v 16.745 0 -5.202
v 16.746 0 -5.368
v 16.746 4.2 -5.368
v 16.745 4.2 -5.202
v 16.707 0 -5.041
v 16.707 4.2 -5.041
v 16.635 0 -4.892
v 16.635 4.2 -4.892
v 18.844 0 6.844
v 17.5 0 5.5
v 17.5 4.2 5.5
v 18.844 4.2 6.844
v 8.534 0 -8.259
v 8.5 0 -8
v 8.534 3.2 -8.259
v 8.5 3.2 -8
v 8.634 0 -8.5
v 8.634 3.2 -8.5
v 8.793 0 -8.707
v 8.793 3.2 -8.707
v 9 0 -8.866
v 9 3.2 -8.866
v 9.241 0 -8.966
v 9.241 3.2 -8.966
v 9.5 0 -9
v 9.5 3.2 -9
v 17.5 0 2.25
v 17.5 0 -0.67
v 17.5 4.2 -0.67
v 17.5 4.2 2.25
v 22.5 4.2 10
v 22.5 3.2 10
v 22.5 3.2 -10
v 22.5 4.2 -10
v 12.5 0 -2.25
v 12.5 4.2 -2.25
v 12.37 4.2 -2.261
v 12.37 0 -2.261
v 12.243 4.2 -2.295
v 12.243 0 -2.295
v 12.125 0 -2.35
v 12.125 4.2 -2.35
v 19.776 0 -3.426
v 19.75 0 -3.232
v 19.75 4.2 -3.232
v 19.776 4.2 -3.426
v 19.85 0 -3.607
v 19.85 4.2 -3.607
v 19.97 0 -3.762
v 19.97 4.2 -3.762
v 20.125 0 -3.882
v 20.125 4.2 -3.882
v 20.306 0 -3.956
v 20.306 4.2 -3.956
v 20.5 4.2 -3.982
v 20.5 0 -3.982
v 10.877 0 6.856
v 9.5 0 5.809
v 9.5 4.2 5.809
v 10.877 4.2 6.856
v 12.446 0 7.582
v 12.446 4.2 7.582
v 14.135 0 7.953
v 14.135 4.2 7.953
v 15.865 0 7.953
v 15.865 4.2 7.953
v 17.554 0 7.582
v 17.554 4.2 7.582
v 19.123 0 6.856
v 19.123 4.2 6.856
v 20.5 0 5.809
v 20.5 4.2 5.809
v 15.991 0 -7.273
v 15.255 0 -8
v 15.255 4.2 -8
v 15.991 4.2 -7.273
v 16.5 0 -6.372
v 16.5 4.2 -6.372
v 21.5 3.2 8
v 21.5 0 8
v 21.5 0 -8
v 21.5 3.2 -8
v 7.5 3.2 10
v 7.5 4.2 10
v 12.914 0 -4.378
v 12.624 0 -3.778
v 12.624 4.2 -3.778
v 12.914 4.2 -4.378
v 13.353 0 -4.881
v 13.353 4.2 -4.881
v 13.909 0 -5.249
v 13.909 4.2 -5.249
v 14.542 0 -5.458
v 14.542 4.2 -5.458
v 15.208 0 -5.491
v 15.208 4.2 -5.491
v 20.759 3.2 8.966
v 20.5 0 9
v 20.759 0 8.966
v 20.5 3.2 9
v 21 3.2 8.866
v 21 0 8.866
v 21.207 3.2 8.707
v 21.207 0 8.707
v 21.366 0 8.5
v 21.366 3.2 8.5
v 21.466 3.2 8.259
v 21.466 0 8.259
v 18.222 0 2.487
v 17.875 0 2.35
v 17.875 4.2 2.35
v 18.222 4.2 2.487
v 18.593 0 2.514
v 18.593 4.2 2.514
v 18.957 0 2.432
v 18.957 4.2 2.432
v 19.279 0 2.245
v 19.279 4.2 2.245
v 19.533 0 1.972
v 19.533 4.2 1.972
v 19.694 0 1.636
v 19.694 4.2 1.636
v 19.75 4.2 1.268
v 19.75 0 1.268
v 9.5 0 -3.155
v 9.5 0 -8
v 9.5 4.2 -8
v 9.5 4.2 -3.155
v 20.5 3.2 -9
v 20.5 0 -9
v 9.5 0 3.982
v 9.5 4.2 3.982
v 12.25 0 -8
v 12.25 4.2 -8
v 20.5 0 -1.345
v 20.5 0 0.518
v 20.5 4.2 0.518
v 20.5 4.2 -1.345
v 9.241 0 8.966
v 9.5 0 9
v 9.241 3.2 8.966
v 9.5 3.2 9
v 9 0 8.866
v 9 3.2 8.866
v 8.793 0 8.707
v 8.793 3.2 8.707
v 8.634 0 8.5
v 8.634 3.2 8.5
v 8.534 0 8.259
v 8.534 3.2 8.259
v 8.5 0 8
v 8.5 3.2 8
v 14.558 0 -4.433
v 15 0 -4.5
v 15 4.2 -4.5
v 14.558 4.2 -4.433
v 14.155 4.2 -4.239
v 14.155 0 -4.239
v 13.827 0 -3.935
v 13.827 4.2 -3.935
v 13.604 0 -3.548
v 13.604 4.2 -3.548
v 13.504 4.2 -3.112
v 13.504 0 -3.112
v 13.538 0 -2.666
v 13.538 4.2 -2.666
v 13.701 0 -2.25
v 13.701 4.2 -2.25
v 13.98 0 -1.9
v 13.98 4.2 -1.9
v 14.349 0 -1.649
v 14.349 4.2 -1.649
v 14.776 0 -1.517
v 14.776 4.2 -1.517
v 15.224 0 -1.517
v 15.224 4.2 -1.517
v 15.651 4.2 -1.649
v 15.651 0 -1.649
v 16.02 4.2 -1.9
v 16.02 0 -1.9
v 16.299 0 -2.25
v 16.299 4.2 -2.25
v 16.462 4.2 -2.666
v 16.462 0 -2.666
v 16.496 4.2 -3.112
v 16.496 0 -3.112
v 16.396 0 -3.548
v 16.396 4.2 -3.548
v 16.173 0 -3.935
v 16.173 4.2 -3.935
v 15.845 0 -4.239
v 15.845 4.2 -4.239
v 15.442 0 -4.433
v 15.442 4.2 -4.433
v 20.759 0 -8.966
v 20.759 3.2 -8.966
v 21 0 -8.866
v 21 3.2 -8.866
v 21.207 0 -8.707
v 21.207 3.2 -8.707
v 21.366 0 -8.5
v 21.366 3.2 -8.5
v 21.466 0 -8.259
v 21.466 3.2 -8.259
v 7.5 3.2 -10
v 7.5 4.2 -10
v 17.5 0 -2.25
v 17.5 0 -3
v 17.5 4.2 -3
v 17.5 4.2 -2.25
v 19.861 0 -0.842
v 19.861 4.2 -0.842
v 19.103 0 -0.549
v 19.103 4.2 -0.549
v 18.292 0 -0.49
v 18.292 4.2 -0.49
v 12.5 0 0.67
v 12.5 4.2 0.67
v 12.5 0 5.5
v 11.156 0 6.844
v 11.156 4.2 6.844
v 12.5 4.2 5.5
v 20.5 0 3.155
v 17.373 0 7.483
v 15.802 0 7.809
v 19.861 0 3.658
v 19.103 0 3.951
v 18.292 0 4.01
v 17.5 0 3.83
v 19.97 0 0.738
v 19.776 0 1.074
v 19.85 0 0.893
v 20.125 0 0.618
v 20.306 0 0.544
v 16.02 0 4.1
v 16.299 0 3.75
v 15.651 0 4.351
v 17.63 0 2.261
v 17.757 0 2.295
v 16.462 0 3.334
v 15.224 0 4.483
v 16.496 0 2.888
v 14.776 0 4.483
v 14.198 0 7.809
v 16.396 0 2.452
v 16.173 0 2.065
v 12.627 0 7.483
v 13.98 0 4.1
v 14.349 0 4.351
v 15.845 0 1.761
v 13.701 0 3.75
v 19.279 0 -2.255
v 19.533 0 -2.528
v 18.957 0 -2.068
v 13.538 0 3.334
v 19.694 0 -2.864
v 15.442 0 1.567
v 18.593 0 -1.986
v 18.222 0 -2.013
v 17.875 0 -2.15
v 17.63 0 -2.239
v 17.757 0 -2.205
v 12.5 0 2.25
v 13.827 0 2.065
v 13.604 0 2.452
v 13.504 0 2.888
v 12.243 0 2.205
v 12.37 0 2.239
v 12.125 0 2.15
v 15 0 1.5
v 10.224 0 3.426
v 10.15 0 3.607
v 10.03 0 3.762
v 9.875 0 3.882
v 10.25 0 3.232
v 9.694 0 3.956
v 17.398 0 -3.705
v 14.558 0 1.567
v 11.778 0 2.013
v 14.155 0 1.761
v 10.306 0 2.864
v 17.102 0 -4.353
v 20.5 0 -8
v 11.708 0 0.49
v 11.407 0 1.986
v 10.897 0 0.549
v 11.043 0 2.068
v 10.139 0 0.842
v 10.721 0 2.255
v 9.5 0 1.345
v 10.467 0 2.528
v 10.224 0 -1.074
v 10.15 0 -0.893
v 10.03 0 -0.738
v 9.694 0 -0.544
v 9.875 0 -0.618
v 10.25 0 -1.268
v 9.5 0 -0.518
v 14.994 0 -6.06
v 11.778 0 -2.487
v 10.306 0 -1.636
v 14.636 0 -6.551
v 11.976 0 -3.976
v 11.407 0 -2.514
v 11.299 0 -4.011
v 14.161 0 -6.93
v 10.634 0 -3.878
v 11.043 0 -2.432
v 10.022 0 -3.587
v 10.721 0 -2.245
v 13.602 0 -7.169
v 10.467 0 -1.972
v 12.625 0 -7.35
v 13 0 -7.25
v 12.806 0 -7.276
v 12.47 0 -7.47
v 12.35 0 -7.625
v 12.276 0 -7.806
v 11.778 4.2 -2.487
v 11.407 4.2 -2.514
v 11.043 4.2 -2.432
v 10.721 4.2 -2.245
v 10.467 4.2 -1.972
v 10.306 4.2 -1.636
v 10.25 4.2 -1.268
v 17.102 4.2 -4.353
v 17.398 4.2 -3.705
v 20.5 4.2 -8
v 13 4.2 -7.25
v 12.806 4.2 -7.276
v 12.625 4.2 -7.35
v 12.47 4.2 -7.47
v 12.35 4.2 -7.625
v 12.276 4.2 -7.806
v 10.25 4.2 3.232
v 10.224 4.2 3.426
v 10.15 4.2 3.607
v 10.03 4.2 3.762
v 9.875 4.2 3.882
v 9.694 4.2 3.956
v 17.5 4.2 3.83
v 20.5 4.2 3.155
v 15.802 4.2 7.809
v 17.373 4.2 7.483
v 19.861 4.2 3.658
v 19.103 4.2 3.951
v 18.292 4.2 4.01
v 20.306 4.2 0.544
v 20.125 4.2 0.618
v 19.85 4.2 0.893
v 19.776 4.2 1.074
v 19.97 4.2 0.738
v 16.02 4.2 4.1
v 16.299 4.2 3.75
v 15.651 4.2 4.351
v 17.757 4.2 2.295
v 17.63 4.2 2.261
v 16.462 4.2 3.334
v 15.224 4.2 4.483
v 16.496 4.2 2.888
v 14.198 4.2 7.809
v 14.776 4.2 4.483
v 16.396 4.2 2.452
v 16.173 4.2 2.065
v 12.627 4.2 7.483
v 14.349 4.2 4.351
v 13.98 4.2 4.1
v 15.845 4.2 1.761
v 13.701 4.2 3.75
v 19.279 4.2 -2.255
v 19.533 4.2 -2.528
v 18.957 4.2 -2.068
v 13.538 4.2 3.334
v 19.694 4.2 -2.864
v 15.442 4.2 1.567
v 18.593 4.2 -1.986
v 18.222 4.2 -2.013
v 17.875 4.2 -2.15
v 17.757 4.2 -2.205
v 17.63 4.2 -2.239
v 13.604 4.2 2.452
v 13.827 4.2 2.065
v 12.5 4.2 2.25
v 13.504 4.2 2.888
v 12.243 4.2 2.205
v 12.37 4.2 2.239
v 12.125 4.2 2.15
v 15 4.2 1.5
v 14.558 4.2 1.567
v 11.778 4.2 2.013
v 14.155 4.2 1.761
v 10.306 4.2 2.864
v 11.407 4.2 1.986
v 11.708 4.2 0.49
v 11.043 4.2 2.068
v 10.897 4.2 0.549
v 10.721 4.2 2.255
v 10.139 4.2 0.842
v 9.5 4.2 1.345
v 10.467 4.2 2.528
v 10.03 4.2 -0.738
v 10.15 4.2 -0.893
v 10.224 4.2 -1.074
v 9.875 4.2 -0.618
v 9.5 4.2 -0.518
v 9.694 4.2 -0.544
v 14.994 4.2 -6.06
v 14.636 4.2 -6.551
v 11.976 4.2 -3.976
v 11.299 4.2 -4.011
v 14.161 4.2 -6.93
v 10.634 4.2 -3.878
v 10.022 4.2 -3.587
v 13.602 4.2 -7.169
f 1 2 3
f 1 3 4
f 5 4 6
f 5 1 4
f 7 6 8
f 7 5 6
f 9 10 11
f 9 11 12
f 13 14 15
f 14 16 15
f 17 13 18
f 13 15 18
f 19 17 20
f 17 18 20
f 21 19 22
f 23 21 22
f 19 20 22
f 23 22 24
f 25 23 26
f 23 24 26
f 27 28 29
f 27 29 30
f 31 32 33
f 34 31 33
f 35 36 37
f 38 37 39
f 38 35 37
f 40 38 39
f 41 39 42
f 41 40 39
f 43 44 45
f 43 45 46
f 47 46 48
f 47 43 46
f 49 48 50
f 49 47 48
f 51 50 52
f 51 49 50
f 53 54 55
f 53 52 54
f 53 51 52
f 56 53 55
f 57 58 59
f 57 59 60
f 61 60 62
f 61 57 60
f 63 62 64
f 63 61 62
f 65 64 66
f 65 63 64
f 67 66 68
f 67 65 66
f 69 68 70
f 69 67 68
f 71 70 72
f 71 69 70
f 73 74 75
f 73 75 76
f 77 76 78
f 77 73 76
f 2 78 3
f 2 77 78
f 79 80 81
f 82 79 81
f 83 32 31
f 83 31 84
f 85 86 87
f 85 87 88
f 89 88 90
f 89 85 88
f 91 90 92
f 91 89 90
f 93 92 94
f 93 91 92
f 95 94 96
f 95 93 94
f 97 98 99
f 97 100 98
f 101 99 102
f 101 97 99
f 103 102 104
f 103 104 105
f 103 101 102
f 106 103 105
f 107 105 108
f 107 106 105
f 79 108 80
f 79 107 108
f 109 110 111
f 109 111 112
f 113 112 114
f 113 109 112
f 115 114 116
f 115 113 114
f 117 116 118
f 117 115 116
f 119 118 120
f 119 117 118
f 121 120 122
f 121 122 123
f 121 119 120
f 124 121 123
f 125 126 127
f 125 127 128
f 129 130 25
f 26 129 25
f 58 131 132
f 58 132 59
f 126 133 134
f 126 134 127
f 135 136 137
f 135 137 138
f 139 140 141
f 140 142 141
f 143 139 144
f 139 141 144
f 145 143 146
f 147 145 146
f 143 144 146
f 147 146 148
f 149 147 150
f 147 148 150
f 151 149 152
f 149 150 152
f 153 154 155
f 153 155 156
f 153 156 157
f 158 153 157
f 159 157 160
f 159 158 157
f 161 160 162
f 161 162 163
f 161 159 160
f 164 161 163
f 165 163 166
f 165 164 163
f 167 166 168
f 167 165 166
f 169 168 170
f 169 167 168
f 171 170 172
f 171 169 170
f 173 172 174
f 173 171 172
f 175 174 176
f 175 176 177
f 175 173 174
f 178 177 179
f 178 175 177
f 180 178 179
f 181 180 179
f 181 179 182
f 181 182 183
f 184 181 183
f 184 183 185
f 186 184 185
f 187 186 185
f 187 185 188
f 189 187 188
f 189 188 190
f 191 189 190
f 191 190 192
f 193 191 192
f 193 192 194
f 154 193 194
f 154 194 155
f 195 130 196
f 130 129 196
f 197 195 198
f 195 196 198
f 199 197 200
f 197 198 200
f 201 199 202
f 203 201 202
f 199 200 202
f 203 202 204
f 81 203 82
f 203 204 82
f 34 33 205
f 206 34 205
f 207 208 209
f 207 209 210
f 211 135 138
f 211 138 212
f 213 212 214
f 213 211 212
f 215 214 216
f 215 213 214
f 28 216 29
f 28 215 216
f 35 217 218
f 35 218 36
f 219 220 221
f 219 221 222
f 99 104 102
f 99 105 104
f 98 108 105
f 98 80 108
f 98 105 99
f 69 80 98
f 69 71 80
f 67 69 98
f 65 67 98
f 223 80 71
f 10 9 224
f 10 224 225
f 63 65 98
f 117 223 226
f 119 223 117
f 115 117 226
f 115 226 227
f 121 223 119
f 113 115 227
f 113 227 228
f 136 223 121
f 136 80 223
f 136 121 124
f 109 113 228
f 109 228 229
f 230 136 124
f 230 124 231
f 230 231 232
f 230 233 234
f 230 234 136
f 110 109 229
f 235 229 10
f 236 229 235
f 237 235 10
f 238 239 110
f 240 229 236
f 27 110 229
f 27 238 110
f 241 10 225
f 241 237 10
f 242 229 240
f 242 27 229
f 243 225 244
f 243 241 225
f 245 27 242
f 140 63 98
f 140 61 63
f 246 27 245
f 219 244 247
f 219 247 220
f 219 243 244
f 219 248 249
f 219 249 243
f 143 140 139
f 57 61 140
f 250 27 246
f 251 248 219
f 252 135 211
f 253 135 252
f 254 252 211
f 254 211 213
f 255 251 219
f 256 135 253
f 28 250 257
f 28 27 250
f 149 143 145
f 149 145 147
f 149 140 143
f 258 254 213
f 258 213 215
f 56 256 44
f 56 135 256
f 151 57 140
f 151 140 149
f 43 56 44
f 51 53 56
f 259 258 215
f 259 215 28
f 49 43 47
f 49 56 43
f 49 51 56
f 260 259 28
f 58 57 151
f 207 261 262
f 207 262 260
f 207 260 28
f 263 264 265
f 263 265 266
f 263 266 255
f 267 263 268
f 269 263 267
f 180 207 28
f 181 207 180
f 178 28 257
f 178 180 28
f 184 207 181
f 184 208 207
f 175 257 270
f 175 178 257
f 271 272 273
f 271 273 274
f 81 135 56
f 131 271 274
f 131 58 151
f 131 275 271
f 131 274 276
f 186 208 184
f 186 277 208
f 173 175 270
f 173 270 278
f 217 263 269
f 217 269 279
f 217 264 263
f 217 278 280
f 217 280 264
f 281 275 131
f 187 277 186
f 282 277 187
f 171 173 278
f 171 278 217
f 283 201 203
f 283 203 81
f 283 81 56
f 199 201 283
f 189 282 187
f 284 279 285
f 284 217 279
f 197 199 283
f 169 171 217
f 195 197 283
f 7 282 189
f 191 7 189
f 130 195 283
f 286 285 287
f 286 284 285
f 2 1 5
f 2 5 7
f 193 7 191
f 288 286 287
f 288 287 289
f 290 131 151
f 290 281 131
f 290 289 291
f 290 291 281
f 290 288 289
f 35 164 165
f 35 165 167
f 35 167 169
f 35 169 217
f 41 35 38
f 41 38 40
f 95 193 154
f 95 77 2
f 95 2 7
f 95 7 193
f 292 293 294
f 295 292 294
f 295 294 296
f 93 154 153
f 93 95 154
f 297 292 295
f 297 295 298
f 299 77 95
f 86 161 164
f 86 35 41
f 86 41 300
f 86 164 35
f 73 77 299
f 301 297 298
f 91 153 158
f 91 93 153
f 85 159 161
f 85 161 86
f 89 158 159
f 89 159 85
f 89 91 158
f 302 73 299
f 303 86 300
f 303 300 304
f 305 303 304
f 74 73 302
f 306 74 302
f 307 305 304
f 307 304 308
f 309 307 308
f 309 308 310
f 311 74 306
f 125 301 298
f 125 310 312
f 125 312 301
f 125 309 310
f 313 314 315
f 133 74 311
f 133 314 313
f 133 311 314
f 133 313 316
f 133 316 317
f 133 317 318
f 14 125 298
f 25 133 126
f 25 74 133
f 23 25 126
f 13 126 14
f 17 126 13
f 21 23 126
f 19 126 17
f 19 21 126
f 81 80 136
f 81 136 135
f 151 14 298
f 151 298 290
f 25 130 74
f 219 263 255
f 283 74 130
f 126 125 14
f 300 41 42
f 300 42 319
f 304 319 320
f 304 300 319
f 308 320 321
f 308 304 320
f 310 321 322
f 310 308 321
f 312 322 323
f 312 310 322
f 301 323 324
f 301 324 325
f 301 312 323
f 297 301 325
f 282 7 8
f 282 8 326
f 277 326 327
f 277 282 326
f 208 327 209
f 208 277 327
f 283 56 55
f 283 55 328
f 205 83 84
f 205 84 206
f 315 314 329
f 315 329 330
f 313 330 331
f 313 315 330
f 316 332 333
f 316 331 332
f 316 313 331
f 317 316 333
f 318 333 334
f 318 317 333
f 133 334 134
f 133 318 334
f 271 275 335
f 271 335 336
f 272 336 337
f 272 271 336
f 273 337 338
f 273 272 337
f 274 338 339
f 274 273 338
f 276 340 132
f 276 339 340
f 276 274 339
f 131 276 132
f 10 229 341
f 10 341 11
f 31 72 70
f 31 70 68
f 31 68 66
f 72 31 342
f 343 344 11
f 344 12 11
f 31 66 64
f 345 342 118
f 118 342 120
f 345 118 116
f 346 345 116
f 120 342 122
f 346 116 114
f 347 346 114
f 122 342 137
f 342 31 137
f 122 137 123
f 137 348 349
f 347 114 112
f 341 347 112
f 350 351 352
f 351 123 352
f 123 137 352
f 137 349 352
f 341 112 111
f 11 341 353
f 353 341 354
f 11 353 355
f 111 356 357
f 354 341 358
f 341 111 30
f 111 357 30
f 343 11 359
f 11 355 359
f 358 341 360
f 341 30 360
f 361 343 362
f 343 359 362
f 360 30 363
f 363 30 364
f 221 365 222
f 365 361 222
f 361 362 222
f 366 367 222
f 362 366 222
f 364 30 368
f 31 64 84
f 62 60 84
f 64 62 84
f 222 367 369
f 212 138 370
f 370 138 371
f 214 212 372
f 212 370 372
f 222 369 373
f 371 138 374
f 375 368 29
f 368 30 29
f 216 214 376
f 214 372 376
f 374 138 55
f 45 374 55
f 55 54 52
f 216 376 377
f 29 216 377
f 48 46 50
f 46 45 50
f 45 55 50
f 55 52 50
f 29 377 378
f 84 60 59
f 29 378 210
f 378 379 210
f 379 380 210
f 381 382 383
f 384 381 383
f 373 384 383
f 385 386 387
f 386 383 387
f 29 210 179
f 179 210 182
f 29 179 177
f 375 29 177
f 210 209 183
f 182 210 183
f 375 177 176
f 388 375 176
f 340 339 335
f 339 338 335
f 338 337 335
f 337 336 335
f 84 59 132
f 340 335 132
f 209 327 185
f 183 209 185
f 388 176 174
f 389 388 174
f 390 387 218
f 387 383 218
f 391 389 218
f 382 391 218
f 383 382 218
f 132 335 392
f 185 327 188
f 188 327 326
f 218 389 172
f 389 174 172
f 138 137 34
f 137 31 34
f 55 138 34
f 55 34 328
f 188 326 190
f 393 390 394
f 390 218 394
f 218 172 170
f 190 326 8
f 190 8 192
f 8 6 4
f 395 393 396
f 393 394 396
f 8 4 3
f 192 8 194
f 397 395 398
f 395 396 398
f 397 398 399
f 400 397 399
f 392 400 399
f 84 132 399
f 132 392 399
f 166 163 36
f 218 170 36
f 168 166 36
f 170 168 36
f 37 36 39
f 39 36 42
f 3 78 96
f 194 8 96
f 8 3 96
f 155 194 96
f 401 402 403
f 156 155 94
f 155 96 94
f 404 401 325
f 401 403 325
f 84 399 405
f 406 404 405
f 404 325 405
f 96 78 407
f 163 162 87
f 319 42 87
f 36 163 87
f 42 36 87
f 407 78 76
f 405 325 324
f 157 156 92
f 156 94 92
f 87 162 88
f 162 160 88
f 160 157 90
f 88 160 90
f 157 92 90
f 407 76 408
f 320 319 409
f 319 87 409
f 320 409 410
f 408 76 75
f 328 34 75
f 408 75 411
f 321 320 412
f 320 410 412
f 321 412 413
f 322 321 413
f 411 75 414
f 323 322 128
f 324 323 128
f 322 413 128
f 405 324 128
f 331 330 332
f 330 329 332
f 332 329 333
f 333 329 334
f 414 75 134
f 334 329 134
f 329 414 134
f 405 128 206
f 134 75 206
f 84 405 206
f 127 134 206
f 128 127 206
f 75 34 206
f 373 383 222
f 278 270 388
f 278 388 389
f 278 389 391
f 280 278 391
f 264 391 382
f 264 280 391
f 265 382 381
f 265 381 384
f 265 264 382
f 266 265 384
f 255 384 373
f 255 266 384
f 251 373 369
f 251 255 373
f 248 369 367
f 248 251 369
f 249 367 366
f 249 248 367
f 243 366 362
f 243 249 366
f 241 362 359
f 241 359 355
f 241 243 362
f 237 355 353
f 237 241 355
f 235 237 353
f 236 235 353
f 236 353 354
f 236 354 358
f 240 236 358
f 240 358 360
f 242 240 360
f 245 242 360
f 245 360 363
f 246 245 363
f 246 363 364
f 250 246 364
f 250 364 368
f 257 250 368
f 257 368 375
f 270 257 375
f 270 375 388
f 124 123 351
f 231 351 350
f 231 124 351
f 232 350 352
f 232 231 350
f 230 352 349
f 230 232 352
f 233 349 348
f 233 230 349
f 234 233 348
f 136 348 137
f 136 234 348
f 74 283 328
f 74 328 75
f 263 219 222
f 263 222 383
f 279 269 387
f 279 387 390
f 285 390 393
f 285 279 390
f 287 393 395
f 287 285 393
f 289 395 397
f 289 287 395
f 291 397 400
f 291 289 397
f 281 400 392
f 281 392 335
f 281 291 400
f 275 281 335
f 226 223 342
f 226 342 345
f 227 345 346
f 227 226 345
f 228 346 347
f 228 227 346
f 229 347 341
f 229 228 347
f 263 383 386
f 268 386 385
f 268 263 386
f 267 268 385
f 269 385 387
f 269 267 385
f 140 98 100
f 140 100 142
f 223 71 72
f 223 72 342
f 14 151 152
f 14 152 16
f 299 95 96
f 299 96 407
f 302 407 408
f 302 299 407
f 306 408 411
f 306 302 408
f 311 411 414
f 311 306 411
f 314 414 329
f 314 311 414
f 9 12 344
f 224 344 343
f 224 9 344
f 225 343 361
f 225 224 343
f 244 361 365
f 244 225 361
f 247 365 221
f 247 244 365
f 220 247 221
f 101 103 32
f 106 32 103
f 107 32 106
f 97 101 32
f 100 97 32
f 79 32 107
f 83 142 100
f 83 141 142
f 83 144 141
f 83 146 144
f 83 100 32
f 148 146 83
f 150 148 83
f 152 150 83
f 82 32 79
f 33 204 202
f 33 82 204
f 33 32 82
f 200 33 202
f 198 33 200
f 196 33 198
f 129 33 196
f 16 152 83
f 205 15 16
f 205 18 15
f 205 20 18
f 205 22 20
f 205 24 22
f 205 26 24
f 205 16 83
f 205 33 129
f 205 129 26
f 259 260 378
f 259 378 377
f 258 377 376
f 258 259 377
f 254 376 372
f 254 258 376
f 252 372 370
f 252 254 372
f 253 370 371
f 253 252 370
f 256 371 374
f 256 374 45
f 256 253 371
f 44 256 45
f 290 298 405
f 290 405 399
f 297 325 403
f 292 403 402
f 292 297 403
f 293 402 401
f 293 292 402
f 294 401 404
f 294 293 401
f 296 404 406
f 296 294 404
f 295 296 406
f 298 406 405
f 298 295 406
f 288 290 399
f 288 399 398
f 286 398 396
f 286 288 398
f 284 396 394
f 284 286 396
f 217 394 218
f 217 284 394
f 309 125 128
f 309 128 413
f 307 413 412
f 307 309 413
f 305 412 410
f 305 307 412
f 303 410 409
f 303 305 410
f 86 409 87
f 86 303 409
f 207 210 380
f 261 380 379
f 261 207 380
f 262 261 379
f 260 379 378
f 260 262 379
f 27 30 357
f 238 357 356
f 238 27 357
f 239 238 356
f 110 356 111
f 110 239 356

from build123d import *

# Parameters (mm, degrees)
SKETCH1_W           = 13
SKETCH1_H           = 18
BOSS_EXTRUDE1_DEPTH = 3.2
SKETCH2_W           = 15
SKETCH2_H           = 20
BOSS_EXTRUDE2_DEPTH = 1
SKETCH4_R           = 1.5
CUT_EXTRUDE2_DEPTH  = 14.18673576
FILLET1_R           = 1


with BuildPart() as part:
    # Sketch1 → Boss-Extrude1 (new body)
    with BuildSketch(Plane(origin=(0, 0, 0), x_dir=(1, 0, 0), z_dir=(0, 1, 0))):
        Rectangle(SKETCH1_W, SKETCH1_H)
    extrude(amount=BOSS_EXTRUDE1_DEPTH)

    # Sketch2 → Boss-Extrude2 (add)
    with BuildSketch(Plane(origin=(0, 3.2, 0), x_dir=(1, 0, 0), z_dir=(0, 1, 0))):
        Rectangle(SKETCH2_W, SKETCH2_H)
    extrude(amount=BOSS_EXTRUDE2_DEPTH)

    # Sketch4 → Cut-Extrude2 (cut, through all)
    with BuildSketch(Plane.XZ):
        with BuildLine():
            Line((-2.5, 5.5), (-3.844272635, 6.844272635))
            ThreePointArc((-3.844272635, 6.844272635), (0, 7.85), (3.844272635, 6.844272635))
            Line((3.844272635, 6.844272635), (2.5, 5.5))
            Line((2.5, 5.5), (2.5, 2.25))
            ThreePointArc((2.5, 2.25), (2.694114284, 2.22444437), (2.875, 2.149519053))
            ThreePointArc((2.875, 2.149519053), (4.125, 2.149519053), (4.75, 3.232050808))
            ThreePointArc((4.75, 3.232050808), (4.969669914, 3.762380893), (5.5, 3.982050808))
            Line((5.5, 3.982050808), (5.5, 5.809475019))
            ThreePointArc((5.5, 5.809475019), (0, 8), (-5.5, 5.809475019))
            Line((-5.5, 5.809475019), (-5.5, 3.155407801))
            ThreePointArc((-5.5, 3.155407801), (-4.103044833, 3.951014031), (-2.5, 3.829686884))
            Line((-2.5, 3.829686884), (-2.5, 5.5))
        make_face()
        with Locations(Location((0, 3, 0), (0, 0, 270))):
            Circle(SKETCH4_R)
        with BuildLine():
            Line((-2.5, -0.670313116), (-2.5, 2.25))
            ThreePointArc((-2.5, 2.25), (-2.694114284, 2.27555563), (-2.875, 2.350480947))
            ThreePointArc((-2.875, 2.350480947), (-4.125, 2.350480947), (-4.75, 1.267949192))
            ThreePointArc((-4.75, 1.267949192), (-4.969669914, 0.737619107), (-5.5, 0.517949192))
            Line((-5.5, 0.517949192), (-5.5, -1.344592199))
            ThreePointArc((-5.5, -1.344592199), (-4.103044833, -0.548985969), (-2.5, -0.670313116))
        make_face()
        with BuildLine():
            ThreePointArc((5.5, 1.344592199), (4.103044833, 0.548985969), (2.5, 0.670313116))
            Line((2.5, 0.670313116), (2.5, -2.25))
            ThreePointArc((2.5, -2.25), (2.694114284, -2.27555563), (2.875, -2.350480947))
            ThreePointArc((2.875, -2.350480947), (4.125, -2.350480947), (4.75, -1.267949192))
            ThreePointArc((4.75, -1.267949192), (4.969669914, -0.737619107), (5.5, -0.517949192))
            Line((5.5, -0.517949192), (5.5, 1.344592199))
        make_face()
        with Locations(Location((0, -3, 0), (0, 0, 270))):
            Circle(SKETCH4_R)
        with BuildLine():
            Line((-2.5, -3), (-2.5, -2.25))
            ThreePointArc((-2.5, -2.25), (-2.694114284, -2.22444437), (-2.875, -2.149519053))
            ThreePointArc((-2.875, -2.149519053), (-4.125, -2.149519053), (-4.75, -3.232050808))
            ThreePointArc((-4.75, -3.232050808), (-4.969669914, -3.762380893), (-5.5, -3.982050808))
            Line((-5.5, -3.982050808), (-5.5, -8))
            Line((-5.5, -8), (-0.25521468, -8))
            ThreePointArc((-0.25521468, -8), (-1.276630283, -6.840114098), (-1.746104794, -5.367626807))
            ThreePointArc((-1.746104794, -5.367626807), (-1.730239257, -5.120259699), (-1.634609263, -4.891574095))
            ThreePointArc((-1.634609263, -4.891574095), (-2.27338109, -4.040066547), (-2.5, -3))
        make_face()
        with BuildLine():
            ThreePointArc((5.5, -3.155407801), (4.037255458, -3.964958012), (2.375948891, -3.777731873))
            ThreePointArc((2.375948891, -3.777731873), (1.381615815, -5.083539714), (-0.208211888, -5.491314474))
            ThreePointArc((-0.208211888, -5.491314474), (0.58851368, -6.756605145), (2, -7.25))
            ThreePointArc((2, -7.25), (2.530330086, -7.469669914), (2.75, -8))
            Line((2.75, -8), (5.5, -8))
            Line((5.5, -8), (5.5, -3.155407801))
        make_face()
    extrude(amount=-CUT_EXTRUDE2_DEPTH, mode=Mode.SUBTRACT)

    # Fillet1
    fillet1_edges = [part.edges().sort_by_distance(p)[0] for p in [
        (6.5, 1.6, 9),
        (-6.5, 1.6, 9),
        (-6.5, 1.6, -9),
        (6.5, 1.6, -9),
    ]]
    fillet(fillet1_edges, radius=FILLET1_R)


with BuildPart() as body_2:
    # Mirror2: mirrored copy
    add(part.part.mirror(Plane(origin=(7.5, 4.2, 10), x_dir=(0, 0, 1), z_dir=(-1, 0, 0))))


solid = body_2.part
